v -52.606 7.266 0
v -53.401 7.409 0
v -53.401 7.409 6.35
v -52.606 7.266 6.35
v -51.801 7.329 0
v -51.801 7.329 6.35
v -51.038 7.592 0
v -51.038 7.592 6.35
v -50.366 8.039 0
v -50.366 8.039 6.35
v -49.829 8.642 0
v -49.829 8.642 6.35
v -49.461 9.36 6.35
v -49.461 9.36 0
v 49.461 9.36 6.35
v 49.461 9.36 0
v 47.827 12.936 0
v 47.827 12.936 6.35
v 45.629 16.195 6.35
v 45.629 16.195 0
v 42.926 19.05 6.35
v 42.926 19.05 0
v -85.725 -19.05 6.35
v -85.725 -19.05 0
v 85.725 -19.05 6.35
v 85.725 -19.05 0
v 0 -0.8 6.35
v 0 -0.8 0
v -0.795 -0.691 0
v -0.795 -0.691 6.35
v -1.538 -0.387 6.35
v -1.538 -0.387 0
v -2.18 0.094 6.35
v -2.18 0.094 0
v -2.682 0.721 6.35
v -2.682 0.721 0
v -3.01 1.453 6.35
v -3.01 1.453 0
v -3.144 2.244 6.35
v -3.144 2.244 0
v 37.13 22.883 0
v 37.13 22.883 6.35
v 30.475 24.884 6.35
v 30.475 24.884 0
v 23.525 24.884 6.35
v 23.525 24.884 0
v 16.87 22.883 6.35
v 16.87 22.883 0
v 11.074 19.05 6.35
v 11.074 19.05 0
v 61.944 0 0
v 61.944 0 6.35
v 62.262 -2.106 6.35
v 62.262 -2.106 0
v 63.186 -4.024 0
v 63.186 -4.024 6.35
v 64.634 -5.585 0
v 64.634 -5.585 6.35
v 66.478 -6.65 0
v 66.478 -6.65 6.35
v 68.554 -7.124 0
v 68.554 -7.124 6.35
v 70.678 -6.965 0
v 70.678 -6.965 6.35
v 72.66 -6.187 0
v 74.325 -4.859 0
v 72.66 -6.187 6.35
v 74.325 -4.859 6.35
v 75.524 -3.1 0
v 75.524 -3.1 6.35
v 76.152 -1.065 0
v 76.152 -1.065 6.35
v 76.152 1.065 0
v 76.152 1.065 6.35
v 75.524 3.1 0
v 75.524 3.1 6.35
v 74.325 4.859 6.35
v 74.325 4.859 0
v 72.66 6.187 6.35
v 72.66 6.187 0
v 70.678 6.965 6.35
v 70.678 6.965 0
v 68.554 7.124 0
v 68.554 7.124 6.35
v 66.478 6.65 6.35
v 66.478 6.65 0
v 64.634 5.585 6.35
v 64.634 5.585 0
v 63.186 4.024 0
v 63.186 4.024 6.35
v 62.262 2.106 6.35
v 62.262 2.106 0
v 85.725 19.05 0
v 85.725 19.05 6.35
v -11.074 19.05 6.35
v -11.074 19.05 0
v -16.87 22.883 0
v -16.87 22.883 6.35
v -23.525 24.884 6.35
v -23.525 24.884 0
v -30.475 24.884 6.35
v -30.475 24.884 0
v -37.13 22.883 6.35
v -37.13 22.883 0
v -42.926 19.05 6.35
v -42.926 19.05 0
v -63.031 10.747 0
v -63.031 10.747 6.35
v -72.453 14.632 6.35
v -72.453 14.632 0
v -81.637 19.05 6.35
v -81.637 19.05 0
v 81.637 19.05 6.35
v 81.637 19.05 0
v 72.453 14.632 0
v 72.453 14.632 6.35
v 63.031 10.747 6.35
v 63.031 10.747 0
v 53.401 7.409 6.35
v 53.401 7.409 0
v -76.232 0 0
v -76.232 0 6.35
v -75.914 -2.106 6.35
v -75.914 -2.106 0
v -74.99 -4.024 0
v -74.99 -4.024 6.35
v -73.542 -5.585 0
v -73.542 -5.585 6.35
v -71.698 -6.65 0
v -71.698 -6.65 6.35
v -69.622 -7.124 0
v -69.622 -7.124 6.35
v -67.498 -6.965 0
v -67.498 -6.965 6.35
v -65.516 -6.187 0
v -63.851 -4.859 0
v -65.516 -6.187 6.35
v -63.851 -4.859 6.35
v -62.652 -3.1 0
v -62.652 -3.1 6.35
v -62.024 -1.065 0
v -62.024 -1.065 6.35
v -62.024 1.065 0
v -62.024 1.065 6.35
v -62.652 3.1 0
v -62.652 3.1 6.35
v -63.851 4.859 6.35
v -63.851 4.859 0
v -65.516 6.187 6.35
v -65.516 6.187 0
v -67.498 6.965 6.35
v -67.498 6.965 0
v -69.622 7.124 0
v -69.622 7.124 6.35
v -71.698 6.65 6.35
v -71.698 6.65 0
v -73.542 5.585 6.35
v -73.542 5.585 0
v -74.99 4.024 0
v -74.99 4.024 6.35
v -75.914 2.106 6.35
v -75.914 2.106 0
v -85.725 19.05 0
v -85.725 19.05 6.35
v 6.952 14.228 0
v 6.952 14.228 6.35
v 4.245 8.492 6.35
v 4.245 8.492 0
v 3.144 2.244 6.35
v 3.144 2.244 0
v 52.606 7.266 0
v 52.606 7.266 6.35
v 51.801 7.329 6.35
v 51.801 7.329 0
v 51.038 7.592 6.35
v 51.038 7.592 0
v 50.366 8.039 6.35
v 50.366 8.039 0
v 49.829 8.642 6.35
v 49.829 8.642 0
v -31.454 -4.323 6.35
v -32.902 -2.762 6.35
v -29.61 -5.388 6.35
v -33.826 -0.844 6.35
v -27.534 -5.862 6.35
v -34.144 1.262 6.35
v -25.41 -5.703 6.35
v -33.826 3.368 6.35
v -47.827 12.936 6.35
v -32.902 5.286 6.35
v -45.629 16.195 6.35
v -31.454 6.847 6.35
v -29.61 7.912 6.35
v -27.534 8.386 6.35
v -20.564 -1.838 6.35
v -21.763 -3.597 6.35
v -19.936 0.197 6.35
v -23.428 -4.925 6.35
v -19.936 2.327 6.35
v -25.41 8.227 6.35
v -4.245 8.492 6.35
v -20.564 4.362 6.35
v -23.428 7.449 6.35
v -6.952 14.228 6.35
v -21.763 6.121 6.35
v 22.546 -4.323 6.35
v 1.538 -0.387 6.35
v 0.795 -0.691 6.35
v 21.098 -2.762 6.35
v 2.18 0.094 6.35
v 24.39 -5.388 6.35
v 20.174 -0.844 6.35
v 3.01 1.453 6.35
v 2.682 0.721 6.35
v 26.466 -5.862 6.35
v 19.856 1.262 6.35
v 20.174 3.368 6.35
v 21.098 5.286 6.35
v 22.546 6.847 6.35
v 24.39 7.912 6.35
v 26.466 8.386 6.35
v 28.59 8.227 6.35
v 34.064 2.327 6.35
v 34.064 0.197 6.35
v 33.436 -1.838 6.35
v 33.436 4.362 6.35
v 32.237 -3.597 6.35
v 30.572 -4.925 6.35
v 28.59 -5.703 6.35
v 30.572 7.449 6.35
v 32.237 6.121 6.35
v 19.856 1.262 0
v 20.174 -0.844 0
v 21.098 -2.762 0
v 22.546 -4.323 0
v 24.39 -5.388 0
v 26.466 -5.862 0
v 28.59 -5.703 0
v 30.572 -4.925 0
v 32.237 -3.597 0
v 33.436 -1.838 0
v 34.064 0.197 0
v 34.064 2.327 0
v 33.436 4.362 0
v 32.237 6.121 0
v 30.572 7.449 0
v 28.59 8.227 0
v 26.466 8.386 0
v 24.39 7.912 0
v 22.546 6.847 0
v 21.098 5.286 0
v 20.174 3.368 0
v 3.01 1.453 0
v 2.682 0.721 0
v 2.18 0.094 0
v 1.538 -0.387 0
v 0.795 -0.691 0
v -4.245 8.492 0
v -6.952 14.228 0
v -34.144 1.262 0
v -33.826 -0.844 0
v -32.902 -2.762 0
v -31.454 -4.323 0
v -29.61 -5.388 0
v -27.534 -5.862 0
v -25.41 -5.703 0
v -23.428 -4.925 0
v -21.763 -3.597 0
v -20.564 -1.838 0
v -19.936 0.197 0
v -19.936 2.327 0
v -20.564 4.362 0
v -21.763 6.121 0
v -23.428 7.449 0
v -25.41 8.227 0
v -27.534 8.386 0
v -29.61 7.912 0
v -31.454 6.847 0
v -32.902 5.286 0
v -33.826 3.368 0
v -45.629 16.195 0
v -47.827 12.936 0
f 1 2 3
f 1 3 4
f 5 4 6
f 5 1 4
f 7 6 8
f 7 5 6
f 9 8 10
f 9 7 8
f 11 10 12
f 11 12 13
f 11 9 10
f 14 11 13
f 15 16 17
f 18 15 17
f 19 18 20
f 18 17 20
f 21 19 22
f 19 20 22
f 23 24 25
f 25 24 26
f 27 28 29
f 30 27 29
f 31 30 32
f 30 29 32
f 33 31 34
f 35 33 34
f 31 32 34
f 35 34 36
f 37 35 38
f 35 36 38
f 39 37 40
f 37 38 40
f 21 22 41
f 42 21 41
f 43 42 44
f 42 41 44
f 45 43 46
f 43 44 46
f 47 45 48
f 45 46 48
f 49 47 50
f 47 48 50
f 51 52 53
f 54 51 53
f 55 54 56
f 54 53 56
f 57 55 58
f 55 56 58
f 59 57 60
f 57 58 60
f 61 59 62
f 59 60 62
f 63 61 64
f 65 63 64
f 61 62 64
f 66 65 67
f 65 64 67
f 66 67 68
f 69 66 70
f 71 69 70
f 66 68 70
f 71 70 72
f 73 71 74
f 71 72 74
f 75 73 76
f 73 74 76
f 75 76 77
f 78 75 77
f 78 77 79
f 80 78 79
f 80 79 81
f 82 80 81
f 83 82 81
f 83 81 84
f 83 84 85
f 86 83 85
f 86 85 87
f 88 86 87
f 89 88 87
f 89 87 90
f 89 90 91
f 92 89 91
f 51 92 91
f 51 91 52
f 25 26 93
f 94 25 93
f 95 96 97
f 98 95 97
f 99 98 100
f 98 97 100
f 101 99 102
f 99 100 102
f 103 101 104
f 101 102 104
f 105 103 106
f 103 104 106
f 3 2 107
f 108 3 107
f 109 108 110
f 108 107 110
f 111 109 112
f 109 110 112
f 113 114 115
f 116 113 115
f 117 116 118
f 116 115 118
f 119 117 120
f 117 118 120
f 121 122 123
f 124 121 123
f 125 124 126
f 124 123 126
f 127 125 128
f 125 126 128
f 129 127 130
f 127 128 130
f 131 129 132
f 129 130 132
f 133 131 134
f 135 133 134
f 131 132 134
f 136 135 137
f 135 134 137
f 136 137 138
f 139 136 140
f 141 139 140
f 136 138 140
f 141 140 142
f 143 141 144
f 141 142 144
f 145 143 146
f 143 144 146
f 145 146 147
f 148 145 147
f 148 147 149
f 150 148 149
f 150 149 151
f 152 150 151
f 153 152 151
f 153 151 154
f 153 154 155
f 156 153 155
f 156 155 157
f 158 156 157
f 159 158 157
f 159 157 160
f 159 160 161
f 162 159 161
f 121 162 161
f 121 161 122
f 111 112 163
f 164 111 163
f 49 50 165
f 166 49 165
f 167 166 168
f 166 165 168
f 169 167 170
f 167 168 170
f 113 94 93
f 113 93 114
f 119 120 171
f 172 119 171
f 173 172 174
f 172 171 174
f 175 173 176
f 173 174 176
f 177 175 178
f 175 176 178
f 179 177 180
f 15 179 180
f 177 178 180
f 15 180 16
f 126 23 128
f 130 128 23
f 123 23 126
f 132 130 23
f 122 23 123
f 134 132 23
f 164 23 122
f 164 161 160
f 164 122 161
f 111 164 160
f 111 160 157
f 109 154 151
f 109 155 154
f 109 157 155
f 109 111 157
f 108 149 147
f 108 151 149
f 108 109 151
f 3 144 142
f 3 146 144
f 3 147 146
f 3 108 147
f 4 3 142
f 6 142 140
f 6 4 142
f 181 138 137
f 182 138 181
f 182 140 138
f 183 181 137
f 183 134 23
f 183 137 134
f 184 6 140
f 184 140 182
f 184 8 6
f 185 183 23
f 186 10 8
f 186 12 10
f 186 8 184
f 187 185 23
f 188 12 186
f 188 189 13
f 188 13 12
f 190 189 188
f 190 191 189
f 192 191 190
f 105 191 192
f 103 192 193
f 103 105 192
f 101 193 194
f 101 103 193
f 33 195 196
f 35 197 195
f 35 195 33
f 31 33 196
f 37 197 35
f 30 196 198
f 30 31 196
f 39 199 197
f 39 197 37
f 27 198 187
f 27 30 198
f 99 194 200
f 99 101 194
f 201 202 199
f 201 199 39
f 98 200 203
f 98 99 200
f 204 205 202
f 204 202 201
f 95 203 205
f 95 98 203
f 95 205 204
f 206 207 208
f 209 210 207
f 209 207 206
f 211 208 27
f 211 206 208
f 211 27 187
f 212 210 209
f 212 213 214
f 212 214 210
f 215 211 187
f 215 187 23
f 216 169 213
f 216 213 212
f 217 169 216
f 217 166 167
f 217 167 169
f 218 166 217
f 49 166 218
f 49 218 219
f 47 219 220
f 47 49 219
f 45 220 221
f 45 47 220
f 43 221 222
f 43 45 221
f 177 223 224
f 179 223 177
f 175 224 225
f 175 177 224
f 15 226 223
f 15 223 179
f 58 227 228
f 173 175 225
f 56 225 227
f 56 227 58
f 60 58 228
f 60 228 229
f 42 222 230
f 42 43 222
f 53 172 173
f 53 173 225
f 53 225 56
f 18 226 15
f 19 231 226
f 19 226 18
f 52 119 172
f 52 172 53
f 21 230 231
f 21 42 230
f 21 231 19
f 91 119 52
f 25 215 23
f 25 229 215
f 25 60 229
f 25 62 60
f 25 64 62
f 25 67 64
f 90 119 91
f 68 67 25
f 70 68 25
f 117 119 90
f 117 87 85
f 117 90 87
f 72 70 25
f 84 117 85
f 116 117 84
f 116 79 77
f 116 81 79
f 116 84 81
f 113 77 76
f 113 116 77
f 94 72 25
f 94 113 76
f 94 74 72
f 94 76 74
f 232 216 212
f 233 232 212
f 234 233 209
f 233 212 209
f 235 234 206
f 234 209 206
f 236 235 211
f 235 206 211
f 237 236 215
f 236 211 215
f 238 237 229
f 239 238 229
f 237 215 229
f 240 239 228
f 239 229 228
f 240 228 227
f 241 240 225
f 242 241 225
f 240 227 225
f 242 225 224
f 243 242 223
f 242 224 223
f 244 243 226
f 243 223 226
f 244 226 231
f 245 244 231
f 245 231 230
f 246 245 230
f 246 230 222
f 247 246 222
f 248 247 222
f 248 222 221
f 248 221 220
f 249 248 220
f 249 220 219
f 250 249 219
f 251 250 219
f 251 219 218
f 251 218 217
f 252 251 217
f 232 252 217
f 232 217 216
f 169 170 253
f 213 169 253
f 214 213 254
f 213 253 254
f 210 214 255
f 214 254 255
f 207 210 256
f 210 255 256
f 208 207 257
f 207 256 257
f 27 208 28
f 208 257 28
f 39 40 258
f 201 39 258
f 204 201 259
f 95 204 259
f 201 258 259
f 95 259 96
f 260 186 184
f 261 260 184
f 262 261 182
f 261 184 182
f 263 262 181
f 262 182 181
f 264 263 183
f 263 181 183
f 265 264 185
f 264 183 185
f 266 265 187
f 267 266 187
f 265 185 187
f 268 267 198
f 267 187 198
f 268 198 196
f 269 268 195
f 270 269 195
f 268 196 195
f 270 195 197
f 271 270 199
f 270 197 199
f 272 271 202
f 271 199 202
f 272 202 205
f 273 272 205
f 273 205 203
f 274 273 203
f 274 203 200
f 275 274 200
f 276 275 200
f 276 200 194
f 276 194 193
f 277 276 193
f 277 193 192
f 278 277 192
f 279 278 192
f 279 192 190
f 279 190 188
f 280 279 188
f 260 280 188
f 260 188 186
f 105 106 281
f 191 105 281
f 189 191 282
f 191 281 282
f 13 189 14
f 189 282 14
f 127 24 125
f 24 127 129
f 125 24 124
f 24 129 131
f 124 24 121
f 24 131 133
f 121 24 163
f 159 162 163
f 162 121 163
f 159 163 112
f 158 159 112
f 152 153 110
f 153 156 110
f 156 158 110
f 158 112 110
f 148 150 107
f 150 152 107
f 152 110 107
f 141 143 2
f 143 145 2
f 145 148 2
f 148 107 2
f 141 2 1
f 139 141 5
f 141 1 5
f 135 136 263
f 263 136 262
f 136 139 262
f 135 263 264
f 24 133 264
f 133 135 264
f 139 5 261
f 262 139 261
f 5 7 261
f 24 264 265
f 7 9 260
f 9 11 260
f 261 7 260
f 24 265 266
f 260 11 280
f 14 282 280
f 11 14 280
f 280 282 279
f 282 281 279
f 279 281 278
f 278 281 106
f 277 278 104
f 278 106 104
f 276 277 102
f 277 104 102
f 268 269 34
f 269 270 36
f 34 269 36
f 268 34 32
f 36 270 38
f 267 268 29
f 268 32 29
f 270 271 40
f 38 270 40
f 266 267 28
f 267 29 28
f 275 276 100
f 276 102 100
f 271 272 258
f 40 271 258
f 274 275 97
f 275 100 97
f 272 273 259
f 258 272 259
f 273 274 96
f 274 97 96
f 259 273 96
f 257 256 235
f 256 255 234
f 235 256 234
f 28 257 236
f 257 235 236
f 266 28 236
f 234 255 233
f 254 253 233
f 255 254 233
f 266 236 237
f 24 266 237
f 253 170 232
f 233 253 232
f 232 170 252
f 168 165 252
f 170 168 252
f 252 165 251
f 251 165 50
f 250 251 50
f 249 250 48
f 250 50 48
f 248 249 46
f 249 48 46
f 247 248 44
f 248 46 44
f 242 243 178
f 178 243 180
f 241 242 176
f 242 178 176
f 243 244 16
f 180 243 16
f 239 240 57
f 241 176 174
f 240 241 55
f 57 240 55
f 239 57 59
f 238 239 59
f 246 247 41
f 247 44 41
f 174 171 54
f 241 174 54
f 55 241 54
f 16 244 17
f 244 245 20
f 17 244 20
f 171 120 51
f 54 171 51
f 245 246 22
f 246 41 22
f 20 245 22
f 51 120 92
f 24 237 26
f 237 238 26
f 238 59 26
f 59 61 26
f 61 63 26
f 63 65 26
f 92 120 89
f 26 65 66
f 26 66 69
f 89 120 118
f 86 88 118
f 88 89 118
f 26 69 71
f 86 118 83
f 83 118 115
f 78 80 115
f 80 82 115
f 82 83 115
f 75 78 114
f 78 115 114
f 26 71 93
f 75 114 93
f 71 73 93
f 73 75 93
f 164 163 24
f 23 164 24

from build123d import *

# Parameters (mm, degrees)
F1_DEPTH    = 6.35
F2_T1_DEPTH = 6.35
F3_D        = 14.2875


# Not quite as in the source:
# - a fillet or chamfer that OpenCascade refuses, or shapes differently, is made with other operations: its cross-section is extruded or revolved along the edge and cut away or added
# - a length typed as a fraction of an inch, garbled in the dataset ("3 / 203.2 mm" for 3/8 in), is restored


with BuildPart() as f1:
    # F0 (on Top) → F1 (new body)
    with BuildSketch(Plane.XY):
        with BuildLine():
            Line((-81.6372310897, 19.05), (-85.725, 19.05))
            Line((-85.725, 19.05), (-85.725, -19.05))
            Line((-85.725, -19.05), (-39.5493225013, -19.05))
            Line((-39.5493225013, -19.05), (85.725, -19.05))
            Line((85.725, -19.05), (85.725, 19.05))
            Line((85.725, 19.05), (81.6372310897, 19.05))
            ThreePointArc((81.6372310897, 19.05), (66.2692873292, 12.0114502249), (50.3024058786, 6.4640566836))
            ThreePointArc((50.3024058786, 6.4640566836), (47.5991921402, 13.3341571472), (42.9264215083, 19.05))
            Line((42.9264215083, 19.05), (11.0735784917, 19.05))
            ThreePointArc((11.0735784917, 19.05), (4.806476702, 10.0660406788), (3.2107124888, -0.7710081124))
            ThreePointArc((3.2107124888, -0.7710081124), (0, -0.8), (-3.2107124888, -0.7710081124))
            ThreePointArc((-3.2107124888, -0.7710081124), (-4.806476702, 10.0660406788), (-11.0735784917, 19.05))
            Line((-11.0735784917, 19.05), (-42.9264215083, 19.05))
            ThreePointArc((-42.9264215083, 19.05), (-47.5991921402, 13.3341571472), (-50.3024058786, 6.4640566836))
            ThreePointArc((-50.3024058786, 6.4640566836), (-66.2692873292, 12.0114502249), (-81.6372310897, 19.05))
        make_face()
        with BuildLine():
            ThreePointArc((-11.0735784917, 19.05), (-27, 25.1380132129), (-42.9264215083, 19.05))
            Line((-42.9264215083, 19.05), (-11.0735784917, 19.05))
        make_face()
        with BuildLine():
            ThreePointArc((42.9264215083, 19.05), (27, 25.1380132129), (11.0735784917, 19.05))
            Line((11.0735784917, 19.05), (42.9264215083, 19.05))
        make_face()
    extrude(amount=F1_DEPTH)

    # F2: fillet of radius 3.175 on 4 edges, made by hand

    # F2_s2 → F2_t1 (join)
    with BuildSketch(Plane.XY):
        with BuildLine():
            ThreePointArc((53.4010264507, 7.4088139849), (51.0383331441, 7.5920475012), (49.4606483484, 9.3603248744))
            ThreePointArc((49.4606483484, 9.3603248744), (49.9273063268, 7.9254958305), (50.3024058786, 6.4640566836))
            ThreePointArc((50.3024058786, 6.4640566836), (51.8538678481, 6.9293782301), (53.4010264507, 7.4088139849))
        make_face()
        with BuildLine():
            ThreePointArc((3.1442176475, 2.2443697426), (2.1701152487, 0.084041365), (-0.0286046325, -0.799997699))
            ThreePointArc((-0.0286046325, -0.799997699), (1.5911199519, -0.792880446), (3.2107124888, -0.7710081124))
            ThreePointArc((3.2107124888, -0.7710081124), (3.1298031747, 0.7356297793), (3.1442176475, 2.2443697426))
        make_face()
        with BuildLine():
            ThreePointArc((0.0286046325, -0.799997699), (-2.1701152487, 0.084041365), (-3.1442176475, 2.2443697426))
            ThreePointArc((-3.1442176475, 2.2443697426), (-3.1298031747, 0.7356297793), (-3.2107124888, -0.7710081124))
            ThreePointArc((-3.2107124888, -0.7710081124), (-1.5911199519, -0.792880446), (0.0286046325, -0.799997699))
        make_face()
        with BuildLine():
            ThreePointArc((-53.4010264507, 7.4088139849), (-51.0383331441, 7.5920475012), (-49.4606483484, 9.3603248744))
            ThreePointArc((-49.4606483484, 9.3603248744), (-49.9273063268, 7.9254958305), (-50.3024058786, 6.4640566836))
            ThreePointArc((-50.3024058786, 6.4640566836), (-51.8538678481, 6.9293782301), (-53.4010264507, 7.4088139849))
        make_face()
    extrude(amount=F2_T1_DEPTH)

    # F3 (through all)
    with Locations(Plane(origin=(0, 0, 0), x_dir=(1, 0, 0), z_dir=(0, 0, -1))):
        with Locations((-69.088, 0), (-27, -1.2620132129), (27, -1.2620132129), (69.088, 0)):
            Hole(F3_D / 2)


solid = f1.part
